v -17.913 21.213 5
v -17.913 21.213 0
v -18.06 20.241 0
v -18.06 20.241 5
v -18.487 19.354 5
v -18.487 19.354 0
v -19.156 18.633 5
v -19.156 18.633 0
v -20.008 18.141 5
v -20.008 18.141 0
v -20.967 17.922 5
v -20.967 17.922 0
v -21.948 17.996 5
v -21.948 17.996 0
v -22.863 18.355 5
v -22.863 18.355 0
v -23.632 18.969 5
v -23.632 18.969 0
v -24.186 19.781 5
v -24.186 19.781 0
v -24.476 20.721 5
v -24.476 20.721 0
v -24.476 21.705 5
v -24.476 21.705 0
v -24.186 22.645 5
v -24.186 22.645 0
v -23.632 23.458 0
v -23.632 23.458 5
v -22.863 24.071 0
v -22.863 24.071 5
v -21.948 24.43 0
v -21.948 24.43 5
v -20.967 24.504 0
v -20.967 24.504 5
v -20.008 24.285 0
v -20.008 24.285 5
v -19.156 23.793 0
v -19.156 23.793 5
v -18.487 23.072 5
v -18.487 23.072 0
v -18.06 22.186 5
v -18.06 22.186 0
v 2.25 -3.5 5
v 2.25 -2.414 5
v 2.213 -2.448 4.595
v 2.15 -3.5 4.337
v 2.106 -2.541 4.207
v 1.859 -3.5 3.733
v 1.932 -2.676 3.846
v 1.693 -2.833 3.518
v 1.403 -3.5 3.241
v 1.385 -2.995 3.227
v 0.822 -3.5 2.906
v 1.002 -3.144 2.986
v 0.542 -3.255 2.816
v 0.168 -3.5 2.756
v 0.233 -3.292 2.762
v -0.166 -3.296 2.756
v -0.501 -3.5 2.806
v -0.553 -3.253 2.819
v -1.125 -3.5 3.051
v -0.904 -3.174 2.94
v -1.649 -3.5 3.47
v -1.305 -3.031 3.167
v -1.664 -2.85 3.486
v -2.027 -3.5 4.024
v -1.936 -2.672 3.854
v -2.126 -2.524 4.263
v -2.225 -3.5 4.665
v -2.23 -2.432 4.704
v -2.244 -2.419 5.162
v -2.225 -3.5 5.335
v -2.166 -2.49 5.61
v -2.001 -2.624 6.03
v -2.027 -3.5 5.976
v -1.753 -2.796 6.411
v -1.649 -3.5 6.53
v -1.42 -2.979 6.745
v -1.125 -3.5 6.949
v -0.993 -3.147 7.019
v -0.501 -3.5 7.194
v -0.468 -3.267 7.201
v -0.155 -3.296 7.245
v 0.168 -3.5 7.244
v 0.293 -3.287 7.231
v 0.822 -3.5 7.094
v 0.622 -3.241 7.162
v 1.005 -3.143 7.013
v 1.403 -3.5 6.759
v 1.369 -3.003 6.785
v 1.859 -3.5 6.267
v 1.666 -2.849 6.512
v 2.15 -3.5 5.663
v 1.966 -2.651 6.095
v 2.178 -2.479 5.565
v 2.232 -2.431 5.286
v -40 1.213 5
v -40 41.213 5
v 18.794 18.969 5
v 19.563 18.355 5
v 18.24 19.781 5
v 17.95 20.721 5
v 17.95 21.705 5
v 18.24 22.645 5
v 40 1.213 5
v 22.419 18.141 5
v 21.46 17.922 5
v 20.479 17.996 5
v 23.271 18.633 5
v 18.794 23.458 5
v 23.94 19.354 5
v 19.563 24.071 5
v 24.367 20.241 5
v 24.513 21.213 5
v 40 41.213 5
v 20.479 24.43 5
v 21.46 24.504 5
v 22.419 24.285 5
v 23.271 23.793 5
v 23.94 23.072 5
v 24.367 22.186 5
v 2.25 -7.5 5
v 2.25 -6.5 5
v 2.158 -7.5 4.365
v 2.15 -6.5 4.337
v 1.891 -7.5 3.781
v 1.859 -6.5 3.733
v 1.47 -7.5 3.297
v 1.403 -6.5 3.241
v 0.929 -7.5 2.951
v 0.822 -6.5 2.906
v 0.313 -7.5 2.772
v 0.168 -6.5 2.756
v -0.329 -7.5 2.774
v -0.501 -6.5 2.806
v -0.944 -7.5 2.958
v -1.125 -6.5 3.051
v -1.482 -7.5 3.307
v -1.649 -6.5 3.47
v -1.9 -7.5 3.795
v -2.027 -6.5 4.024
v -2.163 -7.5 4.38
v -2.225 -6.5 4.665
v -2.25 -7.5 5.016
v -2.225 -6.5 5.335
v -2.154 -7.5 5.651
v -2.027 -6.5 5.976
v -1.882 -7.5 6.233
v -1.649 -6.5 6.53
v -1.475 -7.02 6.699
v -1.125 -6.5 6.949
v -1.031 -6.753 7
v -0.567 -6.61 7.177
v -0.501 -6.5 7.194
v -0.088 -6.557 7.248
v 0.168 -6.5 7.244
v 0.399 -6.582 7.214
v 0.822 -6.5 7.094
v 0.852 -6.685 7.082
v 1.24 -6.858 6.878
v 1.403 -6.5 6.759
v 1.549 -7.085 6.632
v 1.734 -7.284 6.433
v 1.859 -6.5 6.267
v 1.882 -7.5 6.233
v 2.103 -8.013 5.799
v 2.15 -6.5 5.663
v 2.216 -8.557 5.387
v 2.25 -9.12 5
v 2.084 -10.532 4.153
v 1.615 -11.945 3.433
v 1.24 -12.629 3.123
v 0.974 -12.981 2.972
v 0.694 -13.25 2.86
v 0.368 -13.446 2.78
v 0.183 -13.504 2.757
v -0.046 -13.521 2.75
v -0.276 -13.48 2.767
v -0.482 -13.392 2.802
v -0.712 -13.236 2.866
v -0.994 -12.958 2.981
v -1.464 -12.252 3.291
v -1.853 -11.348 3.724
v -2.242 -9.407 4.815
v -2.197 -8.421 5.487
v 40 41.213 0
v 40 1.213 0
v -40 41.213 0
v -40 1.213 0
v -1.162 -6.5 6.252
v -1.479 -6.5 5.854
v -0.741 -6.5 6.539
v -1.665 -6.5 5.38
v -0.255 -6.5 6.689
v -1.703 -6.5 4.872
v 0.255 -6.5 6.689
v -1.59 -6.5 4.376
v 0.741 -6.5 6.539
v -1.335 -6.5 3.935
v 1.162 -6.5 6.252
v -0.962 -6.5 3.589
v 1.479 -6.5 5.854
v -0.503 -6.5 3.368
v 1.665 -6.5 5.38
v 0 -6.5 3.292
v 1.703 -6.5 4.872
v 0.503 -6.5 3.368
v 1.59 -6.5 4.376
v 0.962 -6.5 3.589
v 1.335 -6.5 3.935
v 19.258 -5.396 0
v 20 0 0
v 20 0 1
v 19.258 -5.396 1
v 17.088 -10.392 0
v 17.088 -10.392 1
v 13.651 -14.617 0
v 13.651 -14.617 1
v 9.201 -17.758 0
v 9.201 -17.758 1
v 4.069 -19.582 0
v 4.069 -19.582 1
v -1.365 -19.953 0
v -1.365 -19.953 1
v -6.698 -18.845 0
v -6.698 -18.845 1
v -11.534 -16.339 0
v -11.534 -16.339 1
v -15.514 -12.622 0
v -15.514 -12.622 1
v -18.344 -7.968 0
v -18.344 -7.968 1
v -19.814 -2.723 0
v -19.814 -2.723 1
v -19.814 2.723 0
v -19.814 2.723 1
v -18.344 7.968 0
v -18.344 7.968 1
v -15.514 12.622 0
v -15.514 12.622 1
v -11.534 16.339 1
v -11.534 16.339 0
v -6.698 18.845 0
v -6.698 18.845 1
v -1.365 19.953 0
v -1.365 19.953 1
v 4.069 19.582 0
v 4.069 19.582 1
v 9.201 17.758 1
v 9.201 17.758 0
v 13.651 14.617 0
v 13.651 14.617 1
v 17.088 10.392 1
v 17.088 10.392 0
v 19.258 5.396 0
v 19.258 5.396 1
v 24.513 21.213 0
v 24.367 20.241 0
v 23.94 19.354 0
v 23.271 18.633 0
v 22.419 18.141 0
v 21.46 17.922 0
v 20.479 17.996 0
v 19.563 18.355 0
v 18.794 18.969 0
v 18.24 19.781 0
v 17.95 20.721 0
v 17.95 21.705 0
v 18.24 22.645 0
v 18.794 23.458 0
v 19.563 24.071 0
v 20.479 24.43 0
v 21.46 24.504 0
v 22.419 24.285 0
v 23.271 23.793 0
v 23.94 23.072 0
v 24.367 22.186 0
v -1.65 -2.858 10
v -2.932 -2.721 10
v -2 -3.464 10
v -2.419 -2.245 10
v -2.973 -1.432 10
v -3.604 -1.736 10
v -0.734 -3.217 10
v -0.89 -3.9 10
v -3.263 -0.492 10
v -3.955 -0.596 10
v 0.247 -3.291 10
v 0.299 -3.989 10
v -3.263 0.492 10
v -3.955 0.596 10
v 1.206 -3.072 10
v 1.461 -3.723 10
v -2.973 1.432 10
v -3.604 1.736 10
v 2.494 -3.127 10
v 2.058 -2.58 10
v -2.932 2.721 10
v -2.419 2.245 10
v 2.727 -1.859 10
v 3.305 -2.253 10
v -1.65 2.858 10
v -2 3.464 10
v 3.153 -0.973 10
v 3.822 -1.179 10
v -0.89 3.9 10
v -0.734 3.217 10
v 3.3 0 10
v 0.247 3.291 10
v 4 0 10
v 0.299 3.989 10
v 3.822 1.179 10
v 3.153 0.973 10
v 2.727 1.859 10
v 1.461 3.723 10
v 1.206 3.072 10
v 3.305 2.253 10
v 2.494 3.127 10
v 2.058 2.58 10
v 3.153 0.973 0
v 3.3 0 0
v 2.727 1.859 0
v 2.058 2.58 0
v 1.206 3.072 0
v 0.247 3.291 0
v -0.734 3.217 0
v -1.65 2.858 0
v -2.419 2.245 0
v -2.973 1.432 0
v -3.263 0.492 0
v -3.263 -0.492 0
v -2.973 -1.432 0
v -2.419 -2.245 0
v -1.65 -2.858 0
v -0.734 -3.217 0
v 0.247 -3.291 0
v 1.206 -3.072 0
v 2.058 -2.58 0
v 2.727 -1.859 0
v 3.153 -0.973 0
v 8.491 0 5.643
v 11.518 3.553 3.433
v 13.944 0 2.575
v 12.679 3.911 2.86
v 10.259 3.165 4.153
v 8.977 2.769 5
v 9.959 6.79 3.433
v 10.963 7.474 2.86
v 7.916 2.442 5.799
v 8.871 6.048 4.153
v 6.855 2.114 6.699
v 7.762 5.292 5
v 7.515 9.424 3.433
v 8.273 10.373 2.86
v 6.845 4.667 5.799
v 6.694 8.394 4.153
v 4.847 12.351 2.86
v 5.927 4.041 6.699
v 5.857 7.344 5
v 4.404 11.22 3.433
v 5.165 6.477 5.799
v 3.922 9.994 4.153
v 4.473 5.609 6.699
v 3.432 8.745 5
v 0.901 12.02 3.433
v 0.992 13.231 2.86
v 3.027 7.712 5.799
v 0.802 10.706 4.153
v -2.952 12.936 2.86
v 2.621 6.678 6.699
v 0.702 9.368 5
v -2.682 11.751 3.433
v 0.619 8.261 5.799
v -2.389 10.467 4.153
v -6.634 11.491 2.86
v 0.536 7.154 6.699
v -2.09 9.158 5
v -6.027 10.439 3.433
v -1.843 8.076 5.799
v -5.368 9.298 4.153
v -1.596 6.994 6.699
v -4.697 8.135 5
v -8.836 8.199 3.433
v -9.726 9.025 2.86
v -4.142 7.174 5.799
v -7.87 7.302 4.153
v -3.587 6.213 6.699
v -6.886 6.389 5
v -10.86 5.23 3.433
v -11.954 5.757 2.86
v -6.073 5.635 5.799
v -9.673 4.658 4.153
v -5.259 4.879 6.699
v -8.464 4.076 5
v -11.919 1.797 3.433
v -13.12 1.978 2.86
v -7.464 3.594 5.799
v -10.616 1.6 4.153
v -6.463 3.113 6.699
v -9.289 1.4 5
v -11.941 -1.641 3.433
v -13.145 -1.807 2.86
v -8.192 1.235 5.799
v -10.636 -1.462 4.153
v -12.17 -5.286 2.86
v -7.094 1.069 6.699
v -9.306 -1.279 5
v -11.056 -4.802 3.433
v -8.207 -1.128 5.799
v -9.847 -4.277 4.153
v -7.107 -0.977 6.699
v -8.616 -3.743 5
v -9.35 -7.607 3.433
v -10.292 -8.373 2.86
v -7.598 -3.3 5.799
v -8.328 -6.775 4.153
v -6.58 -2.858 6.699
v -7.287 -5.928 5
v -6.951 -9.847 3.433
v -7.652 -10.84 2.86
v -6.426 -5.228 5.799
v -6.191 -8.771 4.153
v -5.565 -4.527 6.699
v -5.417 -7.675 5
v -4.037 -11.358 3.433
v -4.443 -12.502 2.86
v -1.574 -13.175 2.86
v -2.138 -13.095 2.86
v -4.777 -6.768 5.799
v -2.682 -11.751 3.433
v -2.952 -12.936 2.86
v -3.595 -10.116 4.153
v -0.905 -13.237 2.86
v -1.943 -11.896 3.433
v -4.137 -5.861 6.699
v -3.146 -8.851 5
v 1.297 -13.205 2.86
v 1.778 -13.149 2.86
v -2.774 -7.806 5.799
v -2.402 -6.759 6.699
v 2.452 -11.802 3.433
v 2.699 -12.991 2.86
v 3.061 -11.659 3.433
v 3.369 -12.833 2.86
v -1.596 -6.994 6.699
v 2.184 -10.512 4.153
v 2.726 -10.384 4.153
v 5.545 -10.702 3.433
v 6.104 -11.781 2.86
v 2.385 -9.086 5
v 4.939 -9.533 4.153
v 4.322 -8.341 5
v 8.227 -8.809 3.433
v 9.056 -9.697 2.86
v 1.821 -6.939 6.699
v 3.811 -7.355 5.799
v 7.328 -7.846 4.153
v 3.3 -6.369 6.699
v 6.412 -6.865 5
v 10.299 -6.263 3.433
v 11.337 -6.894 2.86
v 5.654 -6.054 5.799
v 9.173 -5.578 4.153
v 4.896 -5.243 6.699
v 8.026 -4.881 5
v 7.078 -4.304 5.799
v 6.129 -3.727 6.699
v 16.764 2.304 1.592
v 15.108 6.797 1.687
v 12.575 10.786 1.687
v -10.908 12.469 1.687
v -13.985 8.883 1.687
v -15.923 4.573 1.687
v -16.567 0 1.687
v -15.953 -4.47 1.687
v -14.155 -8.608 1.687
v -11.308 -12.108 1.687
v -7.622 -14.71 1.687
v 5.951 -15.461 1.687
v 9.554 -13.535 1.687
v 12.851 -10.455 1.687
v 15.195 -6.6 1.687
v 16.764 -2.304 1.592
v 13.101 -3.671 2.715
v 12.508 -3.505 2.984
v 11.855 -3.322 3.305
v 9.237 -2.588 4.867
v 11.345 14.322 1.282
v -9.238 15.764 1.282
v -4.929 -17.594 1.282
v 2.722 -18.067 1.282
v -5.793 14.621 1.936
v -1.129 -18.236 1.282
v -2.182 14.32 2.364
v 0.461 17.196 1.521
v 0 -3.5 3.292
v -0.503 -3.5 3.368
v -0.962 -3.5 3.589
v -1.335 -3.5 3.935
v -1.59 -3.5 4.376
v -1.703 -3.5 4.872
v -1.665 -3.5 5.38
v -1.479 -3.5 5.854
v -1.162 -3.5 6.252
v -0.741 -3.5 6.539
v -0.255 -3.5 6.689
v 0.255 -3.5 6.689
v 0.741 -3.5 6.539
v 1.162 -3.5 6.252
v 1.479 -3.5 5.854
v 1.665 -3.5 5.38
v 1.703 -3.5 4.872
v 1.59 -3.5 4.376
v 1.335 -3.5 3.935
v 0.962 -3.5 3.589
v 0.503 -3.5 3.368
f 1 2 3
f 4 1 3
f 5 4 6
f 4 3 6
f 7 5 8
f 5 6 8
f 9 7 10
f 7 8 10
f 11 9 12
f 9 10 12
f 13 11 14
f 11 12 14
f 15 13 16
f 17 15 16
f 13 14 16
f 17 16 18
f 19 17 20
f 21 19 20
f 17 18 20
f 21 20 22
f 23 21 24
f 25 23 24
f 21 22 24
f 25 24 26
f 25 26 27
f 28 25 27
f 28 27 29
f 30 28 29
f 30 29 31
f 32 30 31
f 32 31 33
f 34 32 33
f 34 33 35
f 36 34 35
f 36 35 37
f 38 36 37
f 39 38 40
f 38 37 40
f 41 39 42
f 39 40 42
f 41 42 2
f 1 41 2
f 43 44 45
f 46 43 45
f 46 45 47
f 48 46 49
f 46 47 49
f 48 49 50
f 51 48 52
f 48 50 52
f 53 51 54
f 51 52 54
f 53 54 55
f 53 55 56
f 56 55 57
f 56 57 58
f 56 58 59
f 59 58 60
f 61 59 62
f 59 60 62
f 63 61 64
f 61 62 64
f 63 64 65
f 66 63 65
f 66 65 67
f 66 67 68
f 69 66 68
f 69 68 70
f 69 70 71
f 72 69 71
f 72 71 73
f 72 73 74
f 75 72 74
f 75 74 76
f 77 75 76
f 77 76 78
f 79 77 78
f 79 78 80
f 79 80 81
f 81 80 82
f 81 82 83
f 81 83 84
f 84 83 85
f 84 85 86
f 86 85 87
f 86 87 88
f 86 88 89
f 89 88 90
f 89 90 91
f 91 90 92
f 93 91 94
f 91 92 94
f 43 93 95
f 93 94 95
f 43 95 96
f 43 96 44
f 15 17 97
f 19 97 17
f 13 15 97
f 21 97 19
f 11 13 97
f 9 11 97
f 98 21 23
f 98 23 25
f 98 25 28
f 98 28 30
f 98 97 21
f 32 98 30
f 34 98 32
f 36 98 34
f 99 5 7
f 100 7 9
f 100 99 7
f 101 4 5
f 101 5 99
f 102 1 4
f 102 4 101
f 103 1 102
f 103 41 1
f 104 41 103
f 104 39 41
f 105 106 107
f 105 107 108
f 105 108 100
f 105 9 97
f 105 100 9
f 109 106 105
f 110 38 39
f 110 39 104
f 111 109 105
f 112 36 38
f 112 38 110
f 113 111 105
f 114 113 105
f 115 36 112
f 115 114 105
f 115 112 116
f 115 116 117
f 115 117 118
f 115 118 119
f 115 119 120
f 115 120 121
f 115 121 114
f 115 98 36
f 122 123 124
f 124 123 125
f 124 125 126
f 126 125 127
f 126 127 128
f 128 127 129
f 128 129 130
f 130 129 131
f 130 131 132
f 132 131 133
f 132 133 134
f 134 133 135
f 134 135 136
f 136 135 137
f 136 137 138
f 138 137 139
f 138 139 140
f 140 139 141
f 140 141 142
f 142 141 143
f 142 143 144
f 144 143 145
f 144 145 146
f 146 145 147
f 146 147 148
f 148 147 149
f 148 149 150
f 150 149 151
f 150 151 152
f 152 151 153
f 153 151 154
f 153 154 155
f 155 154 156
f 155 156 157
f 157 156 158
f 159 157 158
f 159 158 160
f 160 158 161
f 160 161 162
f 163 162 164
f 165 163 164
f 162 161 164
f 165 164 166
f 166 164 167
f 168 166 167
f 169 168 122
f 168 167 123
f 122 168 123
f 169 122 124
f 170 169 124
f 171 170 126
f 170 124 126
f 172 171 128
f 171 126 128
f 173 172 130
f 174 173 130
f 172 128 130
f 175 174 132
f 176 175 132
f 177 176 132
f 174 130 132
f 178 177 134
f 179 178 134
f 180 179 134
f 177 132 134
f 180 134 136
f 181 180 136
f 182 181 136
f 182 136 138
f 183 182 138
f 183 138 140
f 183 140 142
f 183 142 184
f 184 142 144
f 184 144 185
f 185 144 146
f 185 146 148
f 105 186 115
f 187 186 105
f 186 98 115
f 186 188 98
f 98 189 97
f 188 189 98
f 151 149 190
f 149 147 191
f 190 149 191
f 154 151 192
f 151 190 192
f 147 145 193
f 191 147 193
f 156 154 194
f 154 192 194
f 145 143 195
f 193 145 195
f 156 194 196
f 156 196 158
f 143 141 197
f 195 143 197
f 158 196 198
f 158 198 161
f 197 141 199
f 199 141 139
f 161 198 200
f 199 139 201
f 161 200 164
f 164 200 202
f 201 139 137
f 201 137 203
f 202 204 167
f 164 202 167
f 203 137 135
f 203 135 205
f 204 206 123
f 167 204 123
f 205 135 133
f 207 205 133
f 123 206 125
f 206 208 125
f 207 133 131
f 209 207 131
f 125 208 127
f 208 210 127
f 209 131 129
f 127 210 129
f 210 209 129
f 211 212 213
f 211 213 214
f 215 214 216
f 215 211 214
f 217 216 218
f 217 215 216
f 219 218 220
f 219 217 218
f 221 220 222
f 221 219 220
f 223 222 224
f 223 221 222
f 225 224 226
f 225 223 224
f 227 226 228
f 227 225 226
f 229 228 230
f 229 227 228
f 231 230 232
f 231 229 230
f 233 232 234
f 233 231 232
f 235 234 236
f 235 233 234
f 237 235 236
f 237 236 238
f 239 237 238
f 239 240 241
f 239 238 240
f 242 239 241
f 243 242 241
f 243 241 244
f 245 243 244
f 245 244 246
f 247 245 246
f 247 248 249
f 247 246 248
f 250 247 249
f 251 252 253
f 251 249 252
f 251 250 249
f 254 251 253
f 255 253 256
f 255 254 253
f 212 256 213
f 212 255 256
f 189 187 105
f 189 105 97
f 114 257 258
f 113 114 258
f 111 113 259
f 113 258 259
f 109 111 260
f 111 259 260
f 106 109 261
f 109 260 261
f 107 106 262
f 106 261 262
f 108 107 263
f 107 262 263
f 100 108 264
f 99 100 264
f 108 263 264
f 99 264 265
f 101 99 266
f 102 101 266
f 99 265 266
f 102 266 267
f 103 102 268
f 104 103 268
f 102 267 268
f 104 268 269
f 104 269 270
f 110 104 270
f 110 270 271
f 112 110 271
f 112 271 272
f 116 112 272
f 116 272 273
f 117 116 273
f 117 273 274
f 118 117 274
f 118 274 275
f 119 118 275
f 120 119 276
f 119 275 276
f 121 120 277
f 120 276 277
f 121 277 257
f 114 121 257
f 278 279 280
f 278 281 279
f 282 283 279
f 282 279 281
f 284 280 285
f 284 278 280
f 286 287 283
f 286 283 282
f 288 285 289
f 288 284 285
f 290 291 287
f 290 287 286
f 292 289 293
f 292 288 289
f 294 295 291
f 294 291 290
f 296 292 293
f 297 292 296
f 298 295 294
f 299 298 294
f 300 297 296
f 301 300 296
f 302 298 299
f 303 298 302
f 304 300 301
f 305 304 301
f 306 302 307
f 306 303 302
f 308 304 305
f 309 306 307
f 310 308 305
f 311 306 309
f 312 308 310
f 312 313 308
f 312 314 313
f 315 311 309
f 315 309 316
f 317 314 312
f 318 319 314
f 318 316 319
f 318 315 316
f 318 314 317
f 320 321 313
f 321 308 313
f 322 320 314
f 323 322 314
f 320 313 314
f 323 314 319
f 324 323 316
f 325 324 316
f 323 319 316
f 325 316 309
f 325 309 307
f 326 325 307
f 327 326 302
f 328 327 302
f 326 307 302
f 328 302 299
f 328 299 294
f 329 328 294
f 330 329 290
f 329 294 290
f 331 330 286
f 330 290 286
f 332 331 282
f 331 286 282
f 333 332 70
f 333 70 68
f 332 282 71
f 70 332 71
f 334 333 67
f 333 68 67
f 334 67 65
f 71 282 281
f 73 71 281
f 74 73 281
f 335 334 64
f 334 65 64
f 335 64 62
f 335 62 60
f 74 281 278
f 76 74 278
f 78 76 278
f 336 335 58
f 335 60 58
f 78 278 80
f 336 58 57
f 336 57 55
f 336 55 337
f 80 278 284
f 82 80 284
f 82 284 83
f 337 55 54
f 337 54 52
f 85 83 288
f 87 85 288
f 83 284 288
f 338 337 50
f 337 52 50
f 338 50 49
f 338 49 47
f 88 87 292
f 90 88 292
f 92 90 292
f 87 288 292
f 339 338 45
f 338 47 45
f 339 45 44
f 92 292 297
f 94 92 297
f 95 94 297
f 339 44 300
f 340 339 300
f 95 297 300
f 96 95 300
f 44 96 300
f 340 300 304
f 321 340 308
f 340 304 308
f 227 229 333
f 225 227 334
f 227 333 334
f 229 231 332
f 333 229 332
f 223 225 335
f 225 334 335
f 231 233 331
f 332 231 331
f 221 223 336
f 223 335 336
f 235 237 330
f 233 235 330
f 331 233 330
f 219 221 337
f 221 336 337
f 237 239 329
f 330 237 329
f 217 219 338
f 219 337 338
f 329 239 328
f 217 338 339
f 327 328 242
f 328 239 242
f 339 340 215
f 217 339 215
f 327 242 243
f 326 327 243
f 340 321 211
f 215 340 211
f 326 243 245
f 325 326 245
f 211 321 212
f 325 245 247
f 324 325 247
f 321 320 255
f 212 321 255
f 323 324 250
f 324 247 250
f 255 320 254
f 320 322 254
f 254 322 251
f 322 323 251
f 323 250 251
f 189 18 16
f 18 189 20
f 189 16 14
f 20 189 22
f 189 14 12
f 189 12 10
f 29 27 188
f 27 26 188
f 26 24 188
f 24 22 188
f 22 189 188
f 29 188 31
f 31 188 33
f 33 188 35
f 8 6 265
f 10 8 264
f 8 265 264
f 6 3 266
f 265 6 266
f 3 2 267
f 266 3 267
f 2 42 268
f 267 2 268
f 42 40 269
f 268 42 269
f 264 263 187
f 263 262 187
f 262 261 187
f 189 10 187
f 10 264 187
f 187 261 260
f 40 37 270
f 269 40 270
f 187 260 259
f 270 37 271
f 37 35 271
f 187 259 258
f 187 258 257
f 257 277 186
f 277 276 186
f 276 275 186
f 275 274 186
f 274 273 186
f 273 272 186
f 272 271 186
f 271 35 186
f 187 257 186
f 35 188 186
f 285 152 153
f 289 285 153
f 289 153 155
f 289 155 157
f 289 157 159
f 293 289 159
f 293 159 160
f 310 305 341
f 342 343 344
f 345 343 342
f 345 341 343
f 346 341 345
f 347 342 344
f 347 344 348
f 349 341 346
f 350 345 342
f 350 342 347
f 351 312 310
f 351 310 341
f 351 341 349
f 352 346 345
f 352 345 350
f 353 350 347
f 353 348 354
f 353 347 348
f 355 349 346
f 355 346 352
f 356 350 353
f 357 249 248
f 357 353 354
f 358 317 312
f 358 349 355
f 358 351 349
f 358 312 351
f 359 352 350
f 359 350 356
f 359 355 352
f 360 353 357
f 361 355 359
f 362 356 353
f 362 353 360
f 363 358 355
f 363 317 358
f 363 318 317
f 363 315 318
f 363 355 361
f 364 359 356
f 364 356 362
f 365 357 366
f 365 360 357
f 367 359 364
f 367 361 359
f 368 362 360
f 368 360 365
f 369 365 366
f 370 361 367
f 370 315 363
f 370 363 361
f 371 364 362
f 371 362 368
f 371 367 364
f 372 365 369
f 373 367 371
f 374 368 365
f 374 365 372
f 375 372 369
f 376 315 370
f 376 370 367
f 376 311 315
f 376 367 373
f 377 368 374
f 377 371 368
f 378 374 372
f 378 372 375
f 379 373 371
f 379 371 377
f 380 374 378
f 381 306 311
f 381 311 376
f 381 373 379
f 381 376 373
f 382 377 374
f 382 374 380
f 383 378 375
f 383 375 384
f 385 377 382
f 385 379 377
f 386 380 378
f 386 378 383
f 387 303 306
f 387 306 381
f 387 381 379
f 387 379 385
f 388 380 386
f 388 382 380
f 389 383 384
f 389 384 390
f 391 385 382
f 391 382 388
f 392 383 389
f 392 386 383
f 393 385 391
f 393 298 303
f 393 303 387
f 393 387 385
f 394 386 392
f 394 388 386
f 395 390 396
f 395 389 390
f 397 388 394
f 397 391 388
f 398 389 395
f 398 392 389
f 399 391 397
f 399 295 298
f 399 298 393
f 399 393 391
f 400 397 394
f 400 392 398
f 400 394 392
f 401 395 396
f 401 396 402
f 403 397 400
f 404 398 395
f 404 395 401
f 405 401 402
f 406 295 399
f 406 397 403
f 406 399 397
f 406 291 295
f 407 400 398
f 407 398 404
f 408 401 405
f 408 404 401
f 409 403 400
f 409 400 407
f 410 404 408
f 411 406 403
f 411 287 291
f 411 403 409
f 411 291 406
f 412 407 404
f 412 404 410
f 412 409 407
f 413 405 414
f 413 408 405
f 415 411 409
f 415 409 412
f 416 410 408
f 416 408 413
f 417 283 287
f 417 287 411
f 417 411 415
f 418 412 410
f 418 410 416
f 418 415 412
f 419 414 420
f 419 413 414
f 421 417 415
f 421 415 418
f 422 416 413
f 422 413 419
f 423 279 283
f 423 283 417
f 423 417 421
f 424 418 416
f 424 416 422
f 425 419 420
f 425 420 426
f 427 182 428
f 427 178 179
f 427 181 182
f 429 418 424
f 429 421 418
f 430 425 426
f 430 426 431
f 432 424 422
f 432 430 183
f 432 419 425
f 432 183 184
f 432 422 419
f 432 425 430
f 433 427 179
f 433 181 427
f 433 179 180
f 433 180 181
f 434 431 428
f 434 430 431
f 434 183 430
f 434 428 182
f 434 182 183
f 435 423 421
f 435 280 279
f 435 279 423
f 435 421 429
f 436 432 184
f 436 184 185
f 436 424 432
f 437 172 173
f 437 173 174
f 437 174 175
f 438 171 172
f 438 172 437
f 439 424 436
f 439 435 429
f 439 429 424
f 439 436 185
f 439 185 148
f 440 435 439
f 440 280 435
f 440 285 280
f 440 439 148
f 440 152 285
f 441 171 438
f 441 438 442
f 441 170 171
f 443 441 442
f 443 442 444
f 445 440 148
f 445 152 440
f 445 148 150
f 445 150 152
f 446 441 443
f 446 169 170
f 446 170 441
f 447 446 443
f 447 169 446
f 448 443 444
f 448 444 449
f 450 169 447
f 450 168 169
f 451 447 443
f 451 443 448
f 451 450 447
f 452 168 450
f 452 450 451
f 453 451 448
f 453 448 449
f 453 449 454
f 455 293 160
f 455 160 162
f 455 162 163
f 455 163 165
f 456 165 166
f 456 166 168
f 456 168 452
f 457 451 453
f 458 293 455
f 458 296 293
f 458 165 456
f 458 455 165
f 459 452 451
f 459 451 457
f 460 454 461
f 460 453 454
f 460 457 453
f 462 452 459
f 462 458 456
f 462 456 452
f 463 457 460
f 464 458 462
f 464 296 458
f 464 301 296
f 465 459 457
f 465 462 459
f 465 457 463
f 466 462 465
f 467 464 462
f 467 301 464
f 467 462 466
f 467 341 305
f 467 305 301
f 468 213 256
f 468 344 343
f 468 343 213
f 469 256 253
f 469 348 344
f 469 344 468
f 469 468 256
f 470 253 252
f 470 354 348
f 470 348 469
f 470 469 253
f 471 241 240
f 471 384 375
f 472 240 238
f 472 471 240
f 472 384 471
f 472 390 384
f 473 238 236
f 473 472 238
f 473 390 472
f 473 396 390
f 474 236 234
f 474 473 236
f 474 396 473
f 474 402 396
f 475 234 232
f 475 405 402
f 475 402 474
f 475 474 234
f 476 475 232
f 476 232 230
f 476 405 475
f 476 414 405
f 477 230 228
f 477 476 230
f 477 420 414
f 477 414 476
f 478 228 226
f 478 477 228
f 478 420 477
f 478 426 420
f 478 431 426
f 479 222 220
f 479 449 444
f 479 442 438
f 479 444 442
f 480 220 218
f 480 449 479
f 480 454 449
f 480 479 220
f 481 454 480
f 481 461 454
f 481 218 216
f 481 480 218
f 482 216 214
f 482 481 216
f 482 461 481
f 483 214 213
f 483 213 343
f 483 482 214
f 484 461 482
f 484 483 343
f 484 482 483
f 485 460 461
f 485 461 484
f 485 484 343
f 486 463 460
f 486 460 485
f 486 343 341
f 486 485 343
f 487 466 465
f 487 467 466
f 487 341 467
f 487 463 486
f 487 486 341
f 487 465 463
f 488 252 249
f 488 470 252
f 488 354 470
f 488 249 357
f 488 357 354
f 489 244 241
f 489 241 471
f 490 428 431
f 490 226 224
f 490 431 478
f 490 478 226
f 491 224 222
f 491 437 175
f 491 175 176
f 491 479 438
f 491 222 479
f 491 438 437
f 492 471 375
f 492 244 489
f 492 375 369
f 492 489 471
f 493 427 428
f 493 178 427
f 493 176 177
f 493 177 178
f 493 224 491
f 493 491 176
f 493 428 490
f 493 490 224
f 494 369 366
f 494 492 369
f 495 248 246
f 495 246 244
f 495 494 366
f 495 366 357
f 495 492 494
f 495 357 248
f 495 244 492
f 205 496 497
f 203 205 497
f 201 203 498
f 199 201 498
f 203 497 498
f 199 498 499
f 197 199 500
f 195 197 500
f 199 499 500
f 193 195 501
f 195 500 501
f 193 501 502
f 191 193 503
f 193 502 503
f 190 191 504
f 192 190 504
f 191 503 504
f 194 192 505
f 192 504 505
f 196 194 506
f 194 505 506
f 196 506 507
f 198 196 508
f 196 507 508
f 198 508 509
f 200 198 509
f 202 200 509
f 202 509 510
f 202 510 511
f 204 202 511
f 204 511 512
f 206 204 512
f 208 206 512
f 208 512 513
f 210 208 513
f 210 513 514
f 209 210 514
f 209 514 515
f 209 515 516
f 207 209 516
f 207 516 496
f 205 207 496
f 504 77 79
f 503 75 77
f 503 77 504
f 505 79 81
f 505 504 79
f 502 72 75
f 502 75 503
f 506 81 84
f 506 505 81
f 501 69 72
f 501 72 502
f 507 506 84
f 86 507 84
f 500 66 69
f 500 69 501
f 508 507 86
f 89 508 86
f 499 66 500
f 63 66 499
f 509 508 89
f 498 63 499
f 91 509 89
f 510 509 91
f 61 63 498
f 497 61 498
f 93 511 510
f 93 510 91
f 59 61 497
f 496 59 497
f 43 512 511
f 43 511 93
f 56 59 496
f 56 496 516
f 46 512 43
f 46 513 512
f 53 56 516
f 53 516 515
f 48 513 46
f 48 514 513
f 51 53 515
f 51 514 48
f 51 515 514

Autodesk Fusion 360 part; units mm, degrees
sketch "Sketch1" plane through (0, 0, 0) normal (0, 0, 1) x (1, 0, 0)
  circle A0 centre (0, 0) radius 3.3
  circle A1 centre (0, 0) radius 20
  dimension "d1" = 6.6
sketch "Sketch2" plane through (0, 0, 0) normal (0, 1, 0) x (1, 0, 0)
  line L0 (20, 0) -> (3.3, 0)
  line L1 (3.3, 0) -> (3.3, -10)
  arc A0 (20, -1) -> (4, -10) centre (23.0455, -25.1364) ccw
  line L2 (3.3, -10) -> (4, -10)
  line L3 (20, -1) -> (20, 0)
  line L4 (4, -10) -> (20, -10)
  line L5 (20, -10) -> (20, -1)
revolve "Revolve1" add sketch "Sketch2" angle 360 about axis through (0, 0, 1.75) along (0, 0, 1) contours L0 L1 A0 L2 L3 makes body 1
sketch "Sketch3" plane through (0, 0, 0) normal (0, 1, 0) x (1, 0, 0)
  circle A0 centre (0, -5) radius 0.5
  circle A1 centre (0, -5) radius 2
  circle A2 centre (0, -5) radius 2.25
  dimension "d5" = 4.5
extrude "Extrude1" add sketch "Sketch3" against normal blind 15 contours A0 | A1 bodies 1
extrude "Extrude2" add sketch "Sketch3" against normal blind 15 contours A2 bodies 1
hole "Hole1" at (0, -15, 5) direction (0, 1, 0) diameter 3.416 depth 16 tip angle 180 bodies 1
extrude "Extrude3" cut sketch "Sketch3" against normal blind 3.5 contours A1 | A2 bodies 1
extrude "Extrude4" cut sketch "Sketch3" against normal blind 11 from surface at -7.5 contours A1 | A2 bodies 1
revolve "Revolve2" cut sketch "Sketch2" angle 360 about axis through (0, 0, 1.75) along (0, 0, 1) contours A0 L4 L5 bodies 1
extrude "Extrude5" cut sketch "Sketch3" against normal blind 9.5 from surface at -6.5 contours A1 | A2 bodies 1
sketch "Sketch1 (2)" plane through (0, 0, 0) normal (0, 0, 1) x (1, 0, 0) in component "4 Rod Base"
  line L0 (0, 0) -> (21.2132, 21.2132)
  line L1 (0, 0) -> (30, 0) construction
  line L2 (0, 0) -> (-21.2132, 21.2132)
  line L3 (0, 0) -> (-21.2132, -21.2132)
  line L4 (0, 0) -> (21.2132, -21.2132)
  circle A0 centre (-21.2132, 21.2132) radius 3.3
  circle A1 centre (-21.2132, -21.2132) radius 3.3
  circle A2 centre (21.2132, 21.2132) radius 3.3
  circle A3 centre (21.2132, -21.2132) radius 3.3
  line L5 (37.5, -37.5) -> (-37.5, -37.5)
  line L6 (-37.5, -37.5) -> (-37.5, 37.5)
  line L7 (-37.5, 37.5) -> (37.5, 37.5)
  line L8 (37.5, 37.5) -> (37.5, -37.5)
  line L9 (37.5, -37.5) -> (-37.5, 37.5) construction
  line L10 (-37.5, -37.5) -> (37.5, 37.5) construction
  dimension "d20" = 30
  dimension "d21" = 45
  dimension "d22" = 30
  dimension "d23" = 30
  dimension "d24" = 30
  dimension "d25" = 6.6
  dimension "d26" = 6.6
  dimension "d27" = 6.6
  dimension "d28" = 6.6
  dimension "d29" = 75
  dimension "d30" = 75
sketch "Sketch1 (3)" plane through (0, 0, 0) normal (0, 0, 1) x (1, 0, 0) in component "2 Rod Base"
  line L0 (0, 0) -> (-21.2132, 21.2132)
  line L1 (0, 0) -> (21.2132, 21.2132)
  circle A0 centre (21.2132, 21.2132) radius 3.3
  circle A1 centre (-21.2132, 21.2132) radius 3.3
  line L2 (-21.2132, 21.2132) -> (21.2132, 21.2132)
  line L3 (0, 21.2132) -> (0, 0)
  line L4 (40, 1.2132) -> (-40, 1.2132)
  line L5 (-40, 1.2132) -> (-40, 41.2132)
  line L6 (-40, 41.2132) -> (40, 41.2132)
  line L7 (40, 41.2132) -> (40, 1.2132)
  line L8 (40, 1.2132) -> (-40, 41.2132) construction
  line L9 (-40, 1.2132) -> (40, 41.2132) construction
  point P0 (0, 21.2132)
  dimension "d31" = 30
  dimension "d32" = 30
  dimension "d33" = 6.6
  dimension "d34" = 6.6
  dimension "d35" = 40
extrude "Extrude1'" add sketch "Sketch1 (3)" along normal blind 5 separate body contours L0 L1 A0 A1 L2 L4 L5 L6 L7 | L0 A1 L2 L3 L4 | L1 A0 L2 L3 L4 makes body 2 in component "2 Rod Base"
component "4 Rod Base" placed x (1, 0, 0) y (0, 1, 0) z (0, 0, 1) at (0, 0, 0)
component "2 Rod Base" placed x (1, 0, 0) y (0, 1, 0) z (0, 0, 1) at (0, 0, 0) in component "4 Rod Base"
